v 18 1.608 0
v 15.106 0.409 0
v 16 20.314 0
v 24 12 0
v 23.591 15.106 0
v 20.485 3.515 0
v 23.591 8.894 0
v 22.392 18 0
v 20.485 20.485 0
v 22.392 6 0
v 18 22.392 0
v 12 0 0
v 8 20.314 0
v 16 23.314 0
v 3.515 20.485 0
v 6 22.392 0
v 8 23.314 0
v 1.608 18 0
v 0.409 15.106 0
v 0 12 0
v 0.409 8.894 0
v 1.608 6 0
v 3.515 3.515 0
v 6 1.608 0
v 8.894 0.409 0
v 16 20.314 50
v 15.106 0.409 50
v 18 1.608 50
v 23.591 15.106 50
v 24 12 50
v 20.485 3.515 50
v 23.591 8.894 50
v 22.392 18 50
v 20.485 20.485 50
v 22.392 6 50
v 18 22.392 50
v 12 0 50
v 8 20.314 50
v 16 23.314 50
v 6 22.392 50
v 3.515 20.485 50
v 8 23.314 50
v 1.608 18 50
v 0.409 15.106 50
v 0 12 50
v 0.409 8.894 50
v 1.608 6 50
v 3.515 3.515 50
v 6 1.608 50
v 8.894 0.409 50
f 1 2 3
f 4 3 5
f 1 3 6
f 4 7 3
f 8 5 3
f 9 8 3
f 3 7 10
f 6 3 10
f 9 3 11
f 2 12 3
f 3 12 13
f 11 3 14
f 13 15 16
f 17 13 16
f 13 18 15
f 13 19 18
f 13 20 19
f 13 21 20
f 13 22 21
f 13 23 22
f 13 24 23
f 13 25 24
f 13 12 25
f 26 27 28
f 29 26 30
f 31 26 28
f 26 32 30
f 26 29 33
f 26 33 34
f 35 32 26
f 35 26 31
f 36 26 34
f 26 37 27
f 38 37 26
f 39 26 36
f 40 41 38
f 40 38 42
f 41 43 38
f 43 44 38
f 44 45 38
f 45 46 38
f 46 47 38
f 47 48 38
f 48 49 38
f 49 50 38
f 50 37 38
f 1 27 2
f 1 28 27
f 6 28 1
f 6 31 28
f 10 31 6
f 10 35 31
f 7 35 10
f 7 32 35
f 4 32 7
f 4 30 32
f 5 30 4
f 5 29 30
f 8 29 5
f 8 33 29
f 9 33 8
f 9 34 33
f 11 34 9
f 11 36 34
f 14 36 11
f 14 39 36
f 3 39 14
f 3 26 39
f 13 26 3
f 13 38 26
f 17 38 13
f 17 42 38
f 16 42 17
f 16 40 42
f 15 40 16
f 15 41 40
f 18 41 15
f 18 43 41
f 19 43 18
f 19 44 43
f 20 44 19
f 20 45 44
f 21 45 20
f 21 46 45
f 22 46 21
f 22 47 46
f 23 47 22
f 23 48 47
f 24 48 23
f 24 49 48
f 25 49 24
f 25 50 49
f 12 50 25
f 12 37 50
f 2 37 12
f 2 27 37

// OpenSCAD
$fn = 32;

// ----------------------------------------------------------------------
// Keyway shaft: d24 shaft, key 8 x 3 mm
// ----------------------------------------------------------------------

// --- parameters (mm) ---
shaft_r = 12;             // shaft radius
key_w = 8;                // keyway width
key_d = 3;                // keyway depth below the surface line
plate_t = 50;             // shaft length, Z (extrusion height)
fit_tol = 0.1;            // declared fit tolerance (prompt contract)
free_tol = 0.5;           // declared free tolerance (prompt contract)

shaft_d = 2 * shaft_r;  // shaft diameter
circle_step = 15;  // polygon sampling step, degrees

profile = [[6, 22.392], [3.515, 20.485], [1.608, 18], [0.409, 15.106], [0, 12], [0.409, 8.894], [1.608, 6], [3.515, 3.515], [6, 1.608], [8.894, 0.409], [12, 0], [15.106, 0.409], [18, 1.608], [20.485, 3.515], [22.392, 6], [23.591, 8.894], [24, 12], [23.591, 15.106], [22.392, 18], [20.485, 20.485], [18, 22.392], [16, 23.314], [16, 20.314], [8, 20.314], [8, 23.314]];  // primary outline, 25 points, counter clockwise

// --- the one profile operation ---
linear_extrude(height = plate_t) polygon(points = profile);
